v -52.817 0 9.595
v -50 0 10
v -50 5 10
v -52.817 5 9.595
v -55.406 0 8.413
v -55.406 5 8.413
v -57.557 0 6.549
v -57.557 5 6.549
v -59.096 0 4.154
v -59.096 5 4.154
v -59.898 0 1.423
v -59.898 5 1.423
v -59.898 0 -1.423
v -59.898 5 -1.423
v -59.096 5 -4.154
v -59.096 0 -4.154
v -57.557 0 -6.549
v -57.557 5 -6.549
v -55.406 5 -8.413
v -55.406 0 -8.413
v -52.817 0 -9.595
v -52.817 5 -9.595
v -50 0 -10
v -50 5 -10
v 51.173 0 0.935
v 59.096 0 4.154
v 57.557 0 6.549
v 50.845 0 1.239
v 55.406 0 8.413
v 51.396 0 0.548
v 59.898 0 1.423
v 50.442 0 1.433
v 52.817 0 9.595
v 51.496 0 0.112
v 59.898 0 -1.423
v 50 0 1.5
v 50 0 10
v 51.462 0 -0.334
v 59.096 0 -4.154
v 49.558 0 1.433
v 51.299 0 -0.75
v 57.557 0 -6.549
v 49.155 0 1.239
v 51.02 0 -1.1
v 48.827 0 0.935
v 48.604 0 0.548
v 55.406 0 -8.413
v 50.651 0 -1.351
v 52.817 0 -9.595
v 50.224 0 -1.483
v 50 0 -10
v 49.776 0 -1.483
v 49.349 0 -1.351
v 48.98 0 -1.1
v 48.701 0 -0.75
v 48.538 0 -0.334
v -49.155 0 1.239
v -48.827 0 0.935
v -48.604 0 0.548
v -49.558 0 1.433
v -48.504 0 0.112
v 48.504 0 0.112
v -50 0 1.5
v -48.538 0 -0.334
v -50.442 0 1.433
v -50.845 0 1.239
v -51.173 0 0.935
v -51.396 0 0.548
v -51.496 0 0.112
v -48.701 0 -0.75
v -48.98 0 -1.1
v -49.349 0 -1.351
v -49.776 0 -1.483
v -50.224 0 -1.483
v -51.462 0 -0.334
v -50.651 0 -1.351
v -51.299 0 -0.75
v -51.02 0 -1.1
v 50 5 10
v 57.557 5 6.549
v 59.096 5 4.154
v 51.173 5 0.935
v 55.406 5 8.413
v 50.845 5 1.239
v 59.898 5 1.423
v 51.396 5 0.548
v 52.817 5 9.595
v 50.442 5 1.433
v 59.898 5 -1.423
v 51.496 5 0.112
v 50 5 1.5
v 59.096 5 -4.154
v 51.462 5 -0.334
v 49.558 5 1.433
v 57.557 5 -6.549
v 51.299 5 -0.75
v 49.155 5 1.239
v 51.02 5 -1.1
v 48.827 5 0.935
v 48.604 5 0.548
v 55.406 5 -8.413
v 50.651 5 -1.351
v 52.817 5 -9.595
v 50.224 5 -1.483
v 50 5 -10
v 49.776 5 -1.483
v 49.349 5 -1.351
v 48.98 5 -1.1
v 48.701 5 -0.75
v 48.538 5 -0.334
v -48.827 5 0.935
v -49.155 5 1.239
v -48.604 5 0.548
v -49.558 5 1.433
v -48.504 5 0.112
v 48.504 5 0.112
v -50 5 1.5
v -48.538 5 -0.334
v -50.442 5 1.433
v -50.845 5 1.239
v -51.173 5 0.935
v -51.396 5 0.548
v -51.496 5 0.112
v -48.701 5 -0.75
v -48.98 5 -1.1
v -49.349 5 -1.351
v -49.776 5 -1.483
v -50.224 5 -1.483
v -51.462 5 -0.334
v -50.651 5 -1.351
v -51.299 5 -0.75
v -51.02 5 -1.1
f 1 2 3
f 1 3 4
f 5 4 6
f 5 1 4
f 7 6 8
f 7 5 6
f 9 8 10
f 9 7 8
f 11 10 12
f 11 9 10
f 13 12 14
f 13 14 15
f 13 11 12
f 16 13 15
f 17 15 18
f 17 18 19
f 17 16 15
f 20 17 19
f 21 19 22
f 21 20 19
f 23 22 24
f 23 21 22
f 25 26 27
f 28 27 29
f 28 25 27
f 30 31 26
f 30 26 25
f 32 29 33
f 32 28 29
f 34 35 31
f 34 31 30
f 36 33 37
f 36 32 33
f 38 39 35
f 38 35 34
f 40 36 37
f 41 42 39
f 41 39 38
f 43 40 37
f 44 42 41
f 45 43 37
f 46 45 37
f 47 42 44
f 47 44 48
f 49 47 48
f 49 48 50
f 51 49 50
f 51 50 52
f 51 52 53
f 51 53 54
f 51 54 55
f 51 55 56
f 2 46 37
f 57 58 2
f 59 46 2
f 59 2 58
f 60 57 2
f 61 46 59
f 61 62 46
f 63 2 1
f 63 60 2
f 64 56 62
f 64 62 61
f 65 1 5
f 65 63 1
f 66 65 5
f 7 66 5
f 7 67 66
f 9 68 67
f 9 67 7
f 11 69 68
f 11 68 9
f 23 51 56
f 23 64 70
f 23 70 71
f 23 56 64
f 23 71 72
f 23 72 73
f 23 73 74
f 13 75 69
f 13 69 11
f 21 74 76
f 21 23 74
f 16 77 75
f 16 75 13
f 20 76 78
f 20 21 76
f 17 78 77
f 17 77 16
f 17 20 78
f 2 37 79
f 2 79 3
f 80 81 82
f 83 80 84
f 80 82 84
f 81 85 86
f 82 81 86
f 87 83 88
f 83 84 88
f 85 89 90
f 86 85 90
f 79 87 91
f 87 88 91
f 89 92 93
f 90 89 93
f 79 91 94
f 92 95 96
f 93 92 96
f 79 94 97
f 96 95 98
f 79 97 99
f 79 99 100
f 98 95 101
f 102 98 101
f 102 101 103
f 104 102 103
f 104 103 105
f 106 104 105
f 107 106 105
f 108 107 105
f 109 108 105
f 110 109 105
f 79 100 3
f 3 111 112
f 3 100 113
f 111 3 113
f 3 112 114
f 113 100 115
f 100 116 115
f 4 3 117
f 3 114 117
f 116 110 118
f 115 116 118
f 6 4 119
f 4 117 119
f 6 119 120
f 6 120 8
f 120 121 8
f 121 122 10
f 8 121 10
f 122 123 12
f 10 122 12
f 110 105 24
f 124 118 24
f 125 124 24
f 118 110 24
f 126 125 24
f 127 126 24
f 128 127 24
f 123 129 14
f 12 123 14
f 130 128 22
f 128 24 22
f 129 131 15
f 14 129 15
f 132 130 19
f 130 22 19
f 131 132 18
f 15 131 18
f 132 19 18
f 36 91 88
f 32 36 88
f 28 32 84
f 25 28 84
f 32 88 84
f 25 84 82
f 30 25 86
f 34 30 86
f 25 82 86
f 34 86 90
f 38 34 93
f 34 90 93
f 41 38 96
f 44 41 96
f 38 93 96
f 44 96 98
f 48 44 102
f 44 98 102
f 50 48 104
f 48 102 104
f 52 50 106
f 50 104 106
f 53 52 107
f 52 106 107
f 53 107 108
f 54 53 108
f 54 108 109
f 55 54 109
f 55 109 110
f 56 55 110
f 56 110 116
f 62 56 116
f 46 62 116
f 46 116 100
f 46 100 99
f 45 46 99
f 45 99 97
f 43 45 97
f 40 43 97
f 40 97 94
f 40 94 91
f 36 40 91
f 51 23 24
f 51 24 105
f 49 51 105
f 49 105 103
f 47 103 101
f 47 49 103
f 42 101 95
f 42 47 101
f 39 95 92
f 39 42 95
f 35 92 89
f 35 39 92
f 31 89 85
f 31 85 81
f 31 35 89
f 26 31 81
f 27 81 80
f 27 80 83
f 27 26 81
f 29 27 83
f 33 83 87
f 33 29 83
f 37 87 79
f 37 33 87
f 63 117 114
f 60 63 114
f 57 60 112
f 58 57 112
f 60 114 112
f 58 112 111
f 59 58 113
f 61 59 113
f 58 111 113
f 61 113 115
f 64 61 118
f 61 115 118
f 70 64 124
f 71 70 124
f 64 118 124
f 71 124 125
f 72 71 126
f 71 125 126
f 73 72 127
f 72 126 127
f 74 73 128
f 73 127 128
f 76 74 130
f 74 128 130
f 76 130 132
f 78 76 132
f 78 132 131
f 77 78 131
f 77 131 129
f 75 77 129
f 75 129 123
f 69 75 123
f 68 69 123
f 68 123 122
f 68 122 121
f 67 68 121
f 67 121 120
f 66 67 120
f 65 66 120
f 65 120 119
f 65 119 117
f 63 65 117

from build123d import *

# Parameters (mm, degrees)
BOSS_EXTRUDE1_DEPTH = 5
CUT_EXTRUDE1_REACH  = 63.033
SKETCH2_R           = 1.5


with BuildPart() as part:
    # Sketch1 → Boss-Extrude1 (new body)
    with BuildSketch(Plane(origin=(0, 0, 0), x_dir=(1, 0, 0), z_dir=(0, 1, 0))):
        with BuildLine():
            Line((-50, 10), (50, 10))
            ThreePointArc((50, 10), (60, 0), (50, -10))
            Line((50, -10), (-50, -10))
            ThreePointArc((-50, -10), (-60, 0), (-50, 10))
        make_face()
    extrude(amount=BOSS_EXTRUDE1_DEPTH)

    # Sketch2 → Cut-Extrude1 (cut, up to next)
    with BuildSketch(Plane(origin=(0, 5, 0), x_dir=(1, 0, 0), z_dir=(0, 1, 0)), mode=Mode.PRIVATE) as cut_extrude1_sk1:
        with Locations(Location((-50, 0, 0), (0, 0, 270))):
            Circle(SKETCH2_R)
    cut_extrude1_tool1 = extrude(cut_extrude1_sk1.sketch, amount=-CUT_EXTRUDE1_REACH, mode=Mode.PRIVATE) & part.part
    # Sketch2 → Cut-Extrude1 (cut, up to next)
    with BuildSketch(Plane(origin=(0, 5, 0), x_dir=(1, 0, 0), z_dir=(0, 1, 0)), mode=Mode.PRIVATE) as cut_extrude1_sk2:
        with Locations(Location((50, 0, 0), (0, 0, 270))):
            Circle(SKETCH2_R)
    cut_extrude1_tool2 = extrude(cut_extrude1_sk2.sketch, amount=-CUT_EXTRUDE1_REACH, mode=Mode.PRIVATE) & part.part
    add(cut_extrude1_tool1.solids().sort_by_distance((-50, 5, 0))[0], mode=Mode.SUBTRACT)
    add(cut_extrude1_tool2.solids().sort_by_distance((50, 5, 0))[0], mode=Mode.SUBTRACT)


solid = part.part
